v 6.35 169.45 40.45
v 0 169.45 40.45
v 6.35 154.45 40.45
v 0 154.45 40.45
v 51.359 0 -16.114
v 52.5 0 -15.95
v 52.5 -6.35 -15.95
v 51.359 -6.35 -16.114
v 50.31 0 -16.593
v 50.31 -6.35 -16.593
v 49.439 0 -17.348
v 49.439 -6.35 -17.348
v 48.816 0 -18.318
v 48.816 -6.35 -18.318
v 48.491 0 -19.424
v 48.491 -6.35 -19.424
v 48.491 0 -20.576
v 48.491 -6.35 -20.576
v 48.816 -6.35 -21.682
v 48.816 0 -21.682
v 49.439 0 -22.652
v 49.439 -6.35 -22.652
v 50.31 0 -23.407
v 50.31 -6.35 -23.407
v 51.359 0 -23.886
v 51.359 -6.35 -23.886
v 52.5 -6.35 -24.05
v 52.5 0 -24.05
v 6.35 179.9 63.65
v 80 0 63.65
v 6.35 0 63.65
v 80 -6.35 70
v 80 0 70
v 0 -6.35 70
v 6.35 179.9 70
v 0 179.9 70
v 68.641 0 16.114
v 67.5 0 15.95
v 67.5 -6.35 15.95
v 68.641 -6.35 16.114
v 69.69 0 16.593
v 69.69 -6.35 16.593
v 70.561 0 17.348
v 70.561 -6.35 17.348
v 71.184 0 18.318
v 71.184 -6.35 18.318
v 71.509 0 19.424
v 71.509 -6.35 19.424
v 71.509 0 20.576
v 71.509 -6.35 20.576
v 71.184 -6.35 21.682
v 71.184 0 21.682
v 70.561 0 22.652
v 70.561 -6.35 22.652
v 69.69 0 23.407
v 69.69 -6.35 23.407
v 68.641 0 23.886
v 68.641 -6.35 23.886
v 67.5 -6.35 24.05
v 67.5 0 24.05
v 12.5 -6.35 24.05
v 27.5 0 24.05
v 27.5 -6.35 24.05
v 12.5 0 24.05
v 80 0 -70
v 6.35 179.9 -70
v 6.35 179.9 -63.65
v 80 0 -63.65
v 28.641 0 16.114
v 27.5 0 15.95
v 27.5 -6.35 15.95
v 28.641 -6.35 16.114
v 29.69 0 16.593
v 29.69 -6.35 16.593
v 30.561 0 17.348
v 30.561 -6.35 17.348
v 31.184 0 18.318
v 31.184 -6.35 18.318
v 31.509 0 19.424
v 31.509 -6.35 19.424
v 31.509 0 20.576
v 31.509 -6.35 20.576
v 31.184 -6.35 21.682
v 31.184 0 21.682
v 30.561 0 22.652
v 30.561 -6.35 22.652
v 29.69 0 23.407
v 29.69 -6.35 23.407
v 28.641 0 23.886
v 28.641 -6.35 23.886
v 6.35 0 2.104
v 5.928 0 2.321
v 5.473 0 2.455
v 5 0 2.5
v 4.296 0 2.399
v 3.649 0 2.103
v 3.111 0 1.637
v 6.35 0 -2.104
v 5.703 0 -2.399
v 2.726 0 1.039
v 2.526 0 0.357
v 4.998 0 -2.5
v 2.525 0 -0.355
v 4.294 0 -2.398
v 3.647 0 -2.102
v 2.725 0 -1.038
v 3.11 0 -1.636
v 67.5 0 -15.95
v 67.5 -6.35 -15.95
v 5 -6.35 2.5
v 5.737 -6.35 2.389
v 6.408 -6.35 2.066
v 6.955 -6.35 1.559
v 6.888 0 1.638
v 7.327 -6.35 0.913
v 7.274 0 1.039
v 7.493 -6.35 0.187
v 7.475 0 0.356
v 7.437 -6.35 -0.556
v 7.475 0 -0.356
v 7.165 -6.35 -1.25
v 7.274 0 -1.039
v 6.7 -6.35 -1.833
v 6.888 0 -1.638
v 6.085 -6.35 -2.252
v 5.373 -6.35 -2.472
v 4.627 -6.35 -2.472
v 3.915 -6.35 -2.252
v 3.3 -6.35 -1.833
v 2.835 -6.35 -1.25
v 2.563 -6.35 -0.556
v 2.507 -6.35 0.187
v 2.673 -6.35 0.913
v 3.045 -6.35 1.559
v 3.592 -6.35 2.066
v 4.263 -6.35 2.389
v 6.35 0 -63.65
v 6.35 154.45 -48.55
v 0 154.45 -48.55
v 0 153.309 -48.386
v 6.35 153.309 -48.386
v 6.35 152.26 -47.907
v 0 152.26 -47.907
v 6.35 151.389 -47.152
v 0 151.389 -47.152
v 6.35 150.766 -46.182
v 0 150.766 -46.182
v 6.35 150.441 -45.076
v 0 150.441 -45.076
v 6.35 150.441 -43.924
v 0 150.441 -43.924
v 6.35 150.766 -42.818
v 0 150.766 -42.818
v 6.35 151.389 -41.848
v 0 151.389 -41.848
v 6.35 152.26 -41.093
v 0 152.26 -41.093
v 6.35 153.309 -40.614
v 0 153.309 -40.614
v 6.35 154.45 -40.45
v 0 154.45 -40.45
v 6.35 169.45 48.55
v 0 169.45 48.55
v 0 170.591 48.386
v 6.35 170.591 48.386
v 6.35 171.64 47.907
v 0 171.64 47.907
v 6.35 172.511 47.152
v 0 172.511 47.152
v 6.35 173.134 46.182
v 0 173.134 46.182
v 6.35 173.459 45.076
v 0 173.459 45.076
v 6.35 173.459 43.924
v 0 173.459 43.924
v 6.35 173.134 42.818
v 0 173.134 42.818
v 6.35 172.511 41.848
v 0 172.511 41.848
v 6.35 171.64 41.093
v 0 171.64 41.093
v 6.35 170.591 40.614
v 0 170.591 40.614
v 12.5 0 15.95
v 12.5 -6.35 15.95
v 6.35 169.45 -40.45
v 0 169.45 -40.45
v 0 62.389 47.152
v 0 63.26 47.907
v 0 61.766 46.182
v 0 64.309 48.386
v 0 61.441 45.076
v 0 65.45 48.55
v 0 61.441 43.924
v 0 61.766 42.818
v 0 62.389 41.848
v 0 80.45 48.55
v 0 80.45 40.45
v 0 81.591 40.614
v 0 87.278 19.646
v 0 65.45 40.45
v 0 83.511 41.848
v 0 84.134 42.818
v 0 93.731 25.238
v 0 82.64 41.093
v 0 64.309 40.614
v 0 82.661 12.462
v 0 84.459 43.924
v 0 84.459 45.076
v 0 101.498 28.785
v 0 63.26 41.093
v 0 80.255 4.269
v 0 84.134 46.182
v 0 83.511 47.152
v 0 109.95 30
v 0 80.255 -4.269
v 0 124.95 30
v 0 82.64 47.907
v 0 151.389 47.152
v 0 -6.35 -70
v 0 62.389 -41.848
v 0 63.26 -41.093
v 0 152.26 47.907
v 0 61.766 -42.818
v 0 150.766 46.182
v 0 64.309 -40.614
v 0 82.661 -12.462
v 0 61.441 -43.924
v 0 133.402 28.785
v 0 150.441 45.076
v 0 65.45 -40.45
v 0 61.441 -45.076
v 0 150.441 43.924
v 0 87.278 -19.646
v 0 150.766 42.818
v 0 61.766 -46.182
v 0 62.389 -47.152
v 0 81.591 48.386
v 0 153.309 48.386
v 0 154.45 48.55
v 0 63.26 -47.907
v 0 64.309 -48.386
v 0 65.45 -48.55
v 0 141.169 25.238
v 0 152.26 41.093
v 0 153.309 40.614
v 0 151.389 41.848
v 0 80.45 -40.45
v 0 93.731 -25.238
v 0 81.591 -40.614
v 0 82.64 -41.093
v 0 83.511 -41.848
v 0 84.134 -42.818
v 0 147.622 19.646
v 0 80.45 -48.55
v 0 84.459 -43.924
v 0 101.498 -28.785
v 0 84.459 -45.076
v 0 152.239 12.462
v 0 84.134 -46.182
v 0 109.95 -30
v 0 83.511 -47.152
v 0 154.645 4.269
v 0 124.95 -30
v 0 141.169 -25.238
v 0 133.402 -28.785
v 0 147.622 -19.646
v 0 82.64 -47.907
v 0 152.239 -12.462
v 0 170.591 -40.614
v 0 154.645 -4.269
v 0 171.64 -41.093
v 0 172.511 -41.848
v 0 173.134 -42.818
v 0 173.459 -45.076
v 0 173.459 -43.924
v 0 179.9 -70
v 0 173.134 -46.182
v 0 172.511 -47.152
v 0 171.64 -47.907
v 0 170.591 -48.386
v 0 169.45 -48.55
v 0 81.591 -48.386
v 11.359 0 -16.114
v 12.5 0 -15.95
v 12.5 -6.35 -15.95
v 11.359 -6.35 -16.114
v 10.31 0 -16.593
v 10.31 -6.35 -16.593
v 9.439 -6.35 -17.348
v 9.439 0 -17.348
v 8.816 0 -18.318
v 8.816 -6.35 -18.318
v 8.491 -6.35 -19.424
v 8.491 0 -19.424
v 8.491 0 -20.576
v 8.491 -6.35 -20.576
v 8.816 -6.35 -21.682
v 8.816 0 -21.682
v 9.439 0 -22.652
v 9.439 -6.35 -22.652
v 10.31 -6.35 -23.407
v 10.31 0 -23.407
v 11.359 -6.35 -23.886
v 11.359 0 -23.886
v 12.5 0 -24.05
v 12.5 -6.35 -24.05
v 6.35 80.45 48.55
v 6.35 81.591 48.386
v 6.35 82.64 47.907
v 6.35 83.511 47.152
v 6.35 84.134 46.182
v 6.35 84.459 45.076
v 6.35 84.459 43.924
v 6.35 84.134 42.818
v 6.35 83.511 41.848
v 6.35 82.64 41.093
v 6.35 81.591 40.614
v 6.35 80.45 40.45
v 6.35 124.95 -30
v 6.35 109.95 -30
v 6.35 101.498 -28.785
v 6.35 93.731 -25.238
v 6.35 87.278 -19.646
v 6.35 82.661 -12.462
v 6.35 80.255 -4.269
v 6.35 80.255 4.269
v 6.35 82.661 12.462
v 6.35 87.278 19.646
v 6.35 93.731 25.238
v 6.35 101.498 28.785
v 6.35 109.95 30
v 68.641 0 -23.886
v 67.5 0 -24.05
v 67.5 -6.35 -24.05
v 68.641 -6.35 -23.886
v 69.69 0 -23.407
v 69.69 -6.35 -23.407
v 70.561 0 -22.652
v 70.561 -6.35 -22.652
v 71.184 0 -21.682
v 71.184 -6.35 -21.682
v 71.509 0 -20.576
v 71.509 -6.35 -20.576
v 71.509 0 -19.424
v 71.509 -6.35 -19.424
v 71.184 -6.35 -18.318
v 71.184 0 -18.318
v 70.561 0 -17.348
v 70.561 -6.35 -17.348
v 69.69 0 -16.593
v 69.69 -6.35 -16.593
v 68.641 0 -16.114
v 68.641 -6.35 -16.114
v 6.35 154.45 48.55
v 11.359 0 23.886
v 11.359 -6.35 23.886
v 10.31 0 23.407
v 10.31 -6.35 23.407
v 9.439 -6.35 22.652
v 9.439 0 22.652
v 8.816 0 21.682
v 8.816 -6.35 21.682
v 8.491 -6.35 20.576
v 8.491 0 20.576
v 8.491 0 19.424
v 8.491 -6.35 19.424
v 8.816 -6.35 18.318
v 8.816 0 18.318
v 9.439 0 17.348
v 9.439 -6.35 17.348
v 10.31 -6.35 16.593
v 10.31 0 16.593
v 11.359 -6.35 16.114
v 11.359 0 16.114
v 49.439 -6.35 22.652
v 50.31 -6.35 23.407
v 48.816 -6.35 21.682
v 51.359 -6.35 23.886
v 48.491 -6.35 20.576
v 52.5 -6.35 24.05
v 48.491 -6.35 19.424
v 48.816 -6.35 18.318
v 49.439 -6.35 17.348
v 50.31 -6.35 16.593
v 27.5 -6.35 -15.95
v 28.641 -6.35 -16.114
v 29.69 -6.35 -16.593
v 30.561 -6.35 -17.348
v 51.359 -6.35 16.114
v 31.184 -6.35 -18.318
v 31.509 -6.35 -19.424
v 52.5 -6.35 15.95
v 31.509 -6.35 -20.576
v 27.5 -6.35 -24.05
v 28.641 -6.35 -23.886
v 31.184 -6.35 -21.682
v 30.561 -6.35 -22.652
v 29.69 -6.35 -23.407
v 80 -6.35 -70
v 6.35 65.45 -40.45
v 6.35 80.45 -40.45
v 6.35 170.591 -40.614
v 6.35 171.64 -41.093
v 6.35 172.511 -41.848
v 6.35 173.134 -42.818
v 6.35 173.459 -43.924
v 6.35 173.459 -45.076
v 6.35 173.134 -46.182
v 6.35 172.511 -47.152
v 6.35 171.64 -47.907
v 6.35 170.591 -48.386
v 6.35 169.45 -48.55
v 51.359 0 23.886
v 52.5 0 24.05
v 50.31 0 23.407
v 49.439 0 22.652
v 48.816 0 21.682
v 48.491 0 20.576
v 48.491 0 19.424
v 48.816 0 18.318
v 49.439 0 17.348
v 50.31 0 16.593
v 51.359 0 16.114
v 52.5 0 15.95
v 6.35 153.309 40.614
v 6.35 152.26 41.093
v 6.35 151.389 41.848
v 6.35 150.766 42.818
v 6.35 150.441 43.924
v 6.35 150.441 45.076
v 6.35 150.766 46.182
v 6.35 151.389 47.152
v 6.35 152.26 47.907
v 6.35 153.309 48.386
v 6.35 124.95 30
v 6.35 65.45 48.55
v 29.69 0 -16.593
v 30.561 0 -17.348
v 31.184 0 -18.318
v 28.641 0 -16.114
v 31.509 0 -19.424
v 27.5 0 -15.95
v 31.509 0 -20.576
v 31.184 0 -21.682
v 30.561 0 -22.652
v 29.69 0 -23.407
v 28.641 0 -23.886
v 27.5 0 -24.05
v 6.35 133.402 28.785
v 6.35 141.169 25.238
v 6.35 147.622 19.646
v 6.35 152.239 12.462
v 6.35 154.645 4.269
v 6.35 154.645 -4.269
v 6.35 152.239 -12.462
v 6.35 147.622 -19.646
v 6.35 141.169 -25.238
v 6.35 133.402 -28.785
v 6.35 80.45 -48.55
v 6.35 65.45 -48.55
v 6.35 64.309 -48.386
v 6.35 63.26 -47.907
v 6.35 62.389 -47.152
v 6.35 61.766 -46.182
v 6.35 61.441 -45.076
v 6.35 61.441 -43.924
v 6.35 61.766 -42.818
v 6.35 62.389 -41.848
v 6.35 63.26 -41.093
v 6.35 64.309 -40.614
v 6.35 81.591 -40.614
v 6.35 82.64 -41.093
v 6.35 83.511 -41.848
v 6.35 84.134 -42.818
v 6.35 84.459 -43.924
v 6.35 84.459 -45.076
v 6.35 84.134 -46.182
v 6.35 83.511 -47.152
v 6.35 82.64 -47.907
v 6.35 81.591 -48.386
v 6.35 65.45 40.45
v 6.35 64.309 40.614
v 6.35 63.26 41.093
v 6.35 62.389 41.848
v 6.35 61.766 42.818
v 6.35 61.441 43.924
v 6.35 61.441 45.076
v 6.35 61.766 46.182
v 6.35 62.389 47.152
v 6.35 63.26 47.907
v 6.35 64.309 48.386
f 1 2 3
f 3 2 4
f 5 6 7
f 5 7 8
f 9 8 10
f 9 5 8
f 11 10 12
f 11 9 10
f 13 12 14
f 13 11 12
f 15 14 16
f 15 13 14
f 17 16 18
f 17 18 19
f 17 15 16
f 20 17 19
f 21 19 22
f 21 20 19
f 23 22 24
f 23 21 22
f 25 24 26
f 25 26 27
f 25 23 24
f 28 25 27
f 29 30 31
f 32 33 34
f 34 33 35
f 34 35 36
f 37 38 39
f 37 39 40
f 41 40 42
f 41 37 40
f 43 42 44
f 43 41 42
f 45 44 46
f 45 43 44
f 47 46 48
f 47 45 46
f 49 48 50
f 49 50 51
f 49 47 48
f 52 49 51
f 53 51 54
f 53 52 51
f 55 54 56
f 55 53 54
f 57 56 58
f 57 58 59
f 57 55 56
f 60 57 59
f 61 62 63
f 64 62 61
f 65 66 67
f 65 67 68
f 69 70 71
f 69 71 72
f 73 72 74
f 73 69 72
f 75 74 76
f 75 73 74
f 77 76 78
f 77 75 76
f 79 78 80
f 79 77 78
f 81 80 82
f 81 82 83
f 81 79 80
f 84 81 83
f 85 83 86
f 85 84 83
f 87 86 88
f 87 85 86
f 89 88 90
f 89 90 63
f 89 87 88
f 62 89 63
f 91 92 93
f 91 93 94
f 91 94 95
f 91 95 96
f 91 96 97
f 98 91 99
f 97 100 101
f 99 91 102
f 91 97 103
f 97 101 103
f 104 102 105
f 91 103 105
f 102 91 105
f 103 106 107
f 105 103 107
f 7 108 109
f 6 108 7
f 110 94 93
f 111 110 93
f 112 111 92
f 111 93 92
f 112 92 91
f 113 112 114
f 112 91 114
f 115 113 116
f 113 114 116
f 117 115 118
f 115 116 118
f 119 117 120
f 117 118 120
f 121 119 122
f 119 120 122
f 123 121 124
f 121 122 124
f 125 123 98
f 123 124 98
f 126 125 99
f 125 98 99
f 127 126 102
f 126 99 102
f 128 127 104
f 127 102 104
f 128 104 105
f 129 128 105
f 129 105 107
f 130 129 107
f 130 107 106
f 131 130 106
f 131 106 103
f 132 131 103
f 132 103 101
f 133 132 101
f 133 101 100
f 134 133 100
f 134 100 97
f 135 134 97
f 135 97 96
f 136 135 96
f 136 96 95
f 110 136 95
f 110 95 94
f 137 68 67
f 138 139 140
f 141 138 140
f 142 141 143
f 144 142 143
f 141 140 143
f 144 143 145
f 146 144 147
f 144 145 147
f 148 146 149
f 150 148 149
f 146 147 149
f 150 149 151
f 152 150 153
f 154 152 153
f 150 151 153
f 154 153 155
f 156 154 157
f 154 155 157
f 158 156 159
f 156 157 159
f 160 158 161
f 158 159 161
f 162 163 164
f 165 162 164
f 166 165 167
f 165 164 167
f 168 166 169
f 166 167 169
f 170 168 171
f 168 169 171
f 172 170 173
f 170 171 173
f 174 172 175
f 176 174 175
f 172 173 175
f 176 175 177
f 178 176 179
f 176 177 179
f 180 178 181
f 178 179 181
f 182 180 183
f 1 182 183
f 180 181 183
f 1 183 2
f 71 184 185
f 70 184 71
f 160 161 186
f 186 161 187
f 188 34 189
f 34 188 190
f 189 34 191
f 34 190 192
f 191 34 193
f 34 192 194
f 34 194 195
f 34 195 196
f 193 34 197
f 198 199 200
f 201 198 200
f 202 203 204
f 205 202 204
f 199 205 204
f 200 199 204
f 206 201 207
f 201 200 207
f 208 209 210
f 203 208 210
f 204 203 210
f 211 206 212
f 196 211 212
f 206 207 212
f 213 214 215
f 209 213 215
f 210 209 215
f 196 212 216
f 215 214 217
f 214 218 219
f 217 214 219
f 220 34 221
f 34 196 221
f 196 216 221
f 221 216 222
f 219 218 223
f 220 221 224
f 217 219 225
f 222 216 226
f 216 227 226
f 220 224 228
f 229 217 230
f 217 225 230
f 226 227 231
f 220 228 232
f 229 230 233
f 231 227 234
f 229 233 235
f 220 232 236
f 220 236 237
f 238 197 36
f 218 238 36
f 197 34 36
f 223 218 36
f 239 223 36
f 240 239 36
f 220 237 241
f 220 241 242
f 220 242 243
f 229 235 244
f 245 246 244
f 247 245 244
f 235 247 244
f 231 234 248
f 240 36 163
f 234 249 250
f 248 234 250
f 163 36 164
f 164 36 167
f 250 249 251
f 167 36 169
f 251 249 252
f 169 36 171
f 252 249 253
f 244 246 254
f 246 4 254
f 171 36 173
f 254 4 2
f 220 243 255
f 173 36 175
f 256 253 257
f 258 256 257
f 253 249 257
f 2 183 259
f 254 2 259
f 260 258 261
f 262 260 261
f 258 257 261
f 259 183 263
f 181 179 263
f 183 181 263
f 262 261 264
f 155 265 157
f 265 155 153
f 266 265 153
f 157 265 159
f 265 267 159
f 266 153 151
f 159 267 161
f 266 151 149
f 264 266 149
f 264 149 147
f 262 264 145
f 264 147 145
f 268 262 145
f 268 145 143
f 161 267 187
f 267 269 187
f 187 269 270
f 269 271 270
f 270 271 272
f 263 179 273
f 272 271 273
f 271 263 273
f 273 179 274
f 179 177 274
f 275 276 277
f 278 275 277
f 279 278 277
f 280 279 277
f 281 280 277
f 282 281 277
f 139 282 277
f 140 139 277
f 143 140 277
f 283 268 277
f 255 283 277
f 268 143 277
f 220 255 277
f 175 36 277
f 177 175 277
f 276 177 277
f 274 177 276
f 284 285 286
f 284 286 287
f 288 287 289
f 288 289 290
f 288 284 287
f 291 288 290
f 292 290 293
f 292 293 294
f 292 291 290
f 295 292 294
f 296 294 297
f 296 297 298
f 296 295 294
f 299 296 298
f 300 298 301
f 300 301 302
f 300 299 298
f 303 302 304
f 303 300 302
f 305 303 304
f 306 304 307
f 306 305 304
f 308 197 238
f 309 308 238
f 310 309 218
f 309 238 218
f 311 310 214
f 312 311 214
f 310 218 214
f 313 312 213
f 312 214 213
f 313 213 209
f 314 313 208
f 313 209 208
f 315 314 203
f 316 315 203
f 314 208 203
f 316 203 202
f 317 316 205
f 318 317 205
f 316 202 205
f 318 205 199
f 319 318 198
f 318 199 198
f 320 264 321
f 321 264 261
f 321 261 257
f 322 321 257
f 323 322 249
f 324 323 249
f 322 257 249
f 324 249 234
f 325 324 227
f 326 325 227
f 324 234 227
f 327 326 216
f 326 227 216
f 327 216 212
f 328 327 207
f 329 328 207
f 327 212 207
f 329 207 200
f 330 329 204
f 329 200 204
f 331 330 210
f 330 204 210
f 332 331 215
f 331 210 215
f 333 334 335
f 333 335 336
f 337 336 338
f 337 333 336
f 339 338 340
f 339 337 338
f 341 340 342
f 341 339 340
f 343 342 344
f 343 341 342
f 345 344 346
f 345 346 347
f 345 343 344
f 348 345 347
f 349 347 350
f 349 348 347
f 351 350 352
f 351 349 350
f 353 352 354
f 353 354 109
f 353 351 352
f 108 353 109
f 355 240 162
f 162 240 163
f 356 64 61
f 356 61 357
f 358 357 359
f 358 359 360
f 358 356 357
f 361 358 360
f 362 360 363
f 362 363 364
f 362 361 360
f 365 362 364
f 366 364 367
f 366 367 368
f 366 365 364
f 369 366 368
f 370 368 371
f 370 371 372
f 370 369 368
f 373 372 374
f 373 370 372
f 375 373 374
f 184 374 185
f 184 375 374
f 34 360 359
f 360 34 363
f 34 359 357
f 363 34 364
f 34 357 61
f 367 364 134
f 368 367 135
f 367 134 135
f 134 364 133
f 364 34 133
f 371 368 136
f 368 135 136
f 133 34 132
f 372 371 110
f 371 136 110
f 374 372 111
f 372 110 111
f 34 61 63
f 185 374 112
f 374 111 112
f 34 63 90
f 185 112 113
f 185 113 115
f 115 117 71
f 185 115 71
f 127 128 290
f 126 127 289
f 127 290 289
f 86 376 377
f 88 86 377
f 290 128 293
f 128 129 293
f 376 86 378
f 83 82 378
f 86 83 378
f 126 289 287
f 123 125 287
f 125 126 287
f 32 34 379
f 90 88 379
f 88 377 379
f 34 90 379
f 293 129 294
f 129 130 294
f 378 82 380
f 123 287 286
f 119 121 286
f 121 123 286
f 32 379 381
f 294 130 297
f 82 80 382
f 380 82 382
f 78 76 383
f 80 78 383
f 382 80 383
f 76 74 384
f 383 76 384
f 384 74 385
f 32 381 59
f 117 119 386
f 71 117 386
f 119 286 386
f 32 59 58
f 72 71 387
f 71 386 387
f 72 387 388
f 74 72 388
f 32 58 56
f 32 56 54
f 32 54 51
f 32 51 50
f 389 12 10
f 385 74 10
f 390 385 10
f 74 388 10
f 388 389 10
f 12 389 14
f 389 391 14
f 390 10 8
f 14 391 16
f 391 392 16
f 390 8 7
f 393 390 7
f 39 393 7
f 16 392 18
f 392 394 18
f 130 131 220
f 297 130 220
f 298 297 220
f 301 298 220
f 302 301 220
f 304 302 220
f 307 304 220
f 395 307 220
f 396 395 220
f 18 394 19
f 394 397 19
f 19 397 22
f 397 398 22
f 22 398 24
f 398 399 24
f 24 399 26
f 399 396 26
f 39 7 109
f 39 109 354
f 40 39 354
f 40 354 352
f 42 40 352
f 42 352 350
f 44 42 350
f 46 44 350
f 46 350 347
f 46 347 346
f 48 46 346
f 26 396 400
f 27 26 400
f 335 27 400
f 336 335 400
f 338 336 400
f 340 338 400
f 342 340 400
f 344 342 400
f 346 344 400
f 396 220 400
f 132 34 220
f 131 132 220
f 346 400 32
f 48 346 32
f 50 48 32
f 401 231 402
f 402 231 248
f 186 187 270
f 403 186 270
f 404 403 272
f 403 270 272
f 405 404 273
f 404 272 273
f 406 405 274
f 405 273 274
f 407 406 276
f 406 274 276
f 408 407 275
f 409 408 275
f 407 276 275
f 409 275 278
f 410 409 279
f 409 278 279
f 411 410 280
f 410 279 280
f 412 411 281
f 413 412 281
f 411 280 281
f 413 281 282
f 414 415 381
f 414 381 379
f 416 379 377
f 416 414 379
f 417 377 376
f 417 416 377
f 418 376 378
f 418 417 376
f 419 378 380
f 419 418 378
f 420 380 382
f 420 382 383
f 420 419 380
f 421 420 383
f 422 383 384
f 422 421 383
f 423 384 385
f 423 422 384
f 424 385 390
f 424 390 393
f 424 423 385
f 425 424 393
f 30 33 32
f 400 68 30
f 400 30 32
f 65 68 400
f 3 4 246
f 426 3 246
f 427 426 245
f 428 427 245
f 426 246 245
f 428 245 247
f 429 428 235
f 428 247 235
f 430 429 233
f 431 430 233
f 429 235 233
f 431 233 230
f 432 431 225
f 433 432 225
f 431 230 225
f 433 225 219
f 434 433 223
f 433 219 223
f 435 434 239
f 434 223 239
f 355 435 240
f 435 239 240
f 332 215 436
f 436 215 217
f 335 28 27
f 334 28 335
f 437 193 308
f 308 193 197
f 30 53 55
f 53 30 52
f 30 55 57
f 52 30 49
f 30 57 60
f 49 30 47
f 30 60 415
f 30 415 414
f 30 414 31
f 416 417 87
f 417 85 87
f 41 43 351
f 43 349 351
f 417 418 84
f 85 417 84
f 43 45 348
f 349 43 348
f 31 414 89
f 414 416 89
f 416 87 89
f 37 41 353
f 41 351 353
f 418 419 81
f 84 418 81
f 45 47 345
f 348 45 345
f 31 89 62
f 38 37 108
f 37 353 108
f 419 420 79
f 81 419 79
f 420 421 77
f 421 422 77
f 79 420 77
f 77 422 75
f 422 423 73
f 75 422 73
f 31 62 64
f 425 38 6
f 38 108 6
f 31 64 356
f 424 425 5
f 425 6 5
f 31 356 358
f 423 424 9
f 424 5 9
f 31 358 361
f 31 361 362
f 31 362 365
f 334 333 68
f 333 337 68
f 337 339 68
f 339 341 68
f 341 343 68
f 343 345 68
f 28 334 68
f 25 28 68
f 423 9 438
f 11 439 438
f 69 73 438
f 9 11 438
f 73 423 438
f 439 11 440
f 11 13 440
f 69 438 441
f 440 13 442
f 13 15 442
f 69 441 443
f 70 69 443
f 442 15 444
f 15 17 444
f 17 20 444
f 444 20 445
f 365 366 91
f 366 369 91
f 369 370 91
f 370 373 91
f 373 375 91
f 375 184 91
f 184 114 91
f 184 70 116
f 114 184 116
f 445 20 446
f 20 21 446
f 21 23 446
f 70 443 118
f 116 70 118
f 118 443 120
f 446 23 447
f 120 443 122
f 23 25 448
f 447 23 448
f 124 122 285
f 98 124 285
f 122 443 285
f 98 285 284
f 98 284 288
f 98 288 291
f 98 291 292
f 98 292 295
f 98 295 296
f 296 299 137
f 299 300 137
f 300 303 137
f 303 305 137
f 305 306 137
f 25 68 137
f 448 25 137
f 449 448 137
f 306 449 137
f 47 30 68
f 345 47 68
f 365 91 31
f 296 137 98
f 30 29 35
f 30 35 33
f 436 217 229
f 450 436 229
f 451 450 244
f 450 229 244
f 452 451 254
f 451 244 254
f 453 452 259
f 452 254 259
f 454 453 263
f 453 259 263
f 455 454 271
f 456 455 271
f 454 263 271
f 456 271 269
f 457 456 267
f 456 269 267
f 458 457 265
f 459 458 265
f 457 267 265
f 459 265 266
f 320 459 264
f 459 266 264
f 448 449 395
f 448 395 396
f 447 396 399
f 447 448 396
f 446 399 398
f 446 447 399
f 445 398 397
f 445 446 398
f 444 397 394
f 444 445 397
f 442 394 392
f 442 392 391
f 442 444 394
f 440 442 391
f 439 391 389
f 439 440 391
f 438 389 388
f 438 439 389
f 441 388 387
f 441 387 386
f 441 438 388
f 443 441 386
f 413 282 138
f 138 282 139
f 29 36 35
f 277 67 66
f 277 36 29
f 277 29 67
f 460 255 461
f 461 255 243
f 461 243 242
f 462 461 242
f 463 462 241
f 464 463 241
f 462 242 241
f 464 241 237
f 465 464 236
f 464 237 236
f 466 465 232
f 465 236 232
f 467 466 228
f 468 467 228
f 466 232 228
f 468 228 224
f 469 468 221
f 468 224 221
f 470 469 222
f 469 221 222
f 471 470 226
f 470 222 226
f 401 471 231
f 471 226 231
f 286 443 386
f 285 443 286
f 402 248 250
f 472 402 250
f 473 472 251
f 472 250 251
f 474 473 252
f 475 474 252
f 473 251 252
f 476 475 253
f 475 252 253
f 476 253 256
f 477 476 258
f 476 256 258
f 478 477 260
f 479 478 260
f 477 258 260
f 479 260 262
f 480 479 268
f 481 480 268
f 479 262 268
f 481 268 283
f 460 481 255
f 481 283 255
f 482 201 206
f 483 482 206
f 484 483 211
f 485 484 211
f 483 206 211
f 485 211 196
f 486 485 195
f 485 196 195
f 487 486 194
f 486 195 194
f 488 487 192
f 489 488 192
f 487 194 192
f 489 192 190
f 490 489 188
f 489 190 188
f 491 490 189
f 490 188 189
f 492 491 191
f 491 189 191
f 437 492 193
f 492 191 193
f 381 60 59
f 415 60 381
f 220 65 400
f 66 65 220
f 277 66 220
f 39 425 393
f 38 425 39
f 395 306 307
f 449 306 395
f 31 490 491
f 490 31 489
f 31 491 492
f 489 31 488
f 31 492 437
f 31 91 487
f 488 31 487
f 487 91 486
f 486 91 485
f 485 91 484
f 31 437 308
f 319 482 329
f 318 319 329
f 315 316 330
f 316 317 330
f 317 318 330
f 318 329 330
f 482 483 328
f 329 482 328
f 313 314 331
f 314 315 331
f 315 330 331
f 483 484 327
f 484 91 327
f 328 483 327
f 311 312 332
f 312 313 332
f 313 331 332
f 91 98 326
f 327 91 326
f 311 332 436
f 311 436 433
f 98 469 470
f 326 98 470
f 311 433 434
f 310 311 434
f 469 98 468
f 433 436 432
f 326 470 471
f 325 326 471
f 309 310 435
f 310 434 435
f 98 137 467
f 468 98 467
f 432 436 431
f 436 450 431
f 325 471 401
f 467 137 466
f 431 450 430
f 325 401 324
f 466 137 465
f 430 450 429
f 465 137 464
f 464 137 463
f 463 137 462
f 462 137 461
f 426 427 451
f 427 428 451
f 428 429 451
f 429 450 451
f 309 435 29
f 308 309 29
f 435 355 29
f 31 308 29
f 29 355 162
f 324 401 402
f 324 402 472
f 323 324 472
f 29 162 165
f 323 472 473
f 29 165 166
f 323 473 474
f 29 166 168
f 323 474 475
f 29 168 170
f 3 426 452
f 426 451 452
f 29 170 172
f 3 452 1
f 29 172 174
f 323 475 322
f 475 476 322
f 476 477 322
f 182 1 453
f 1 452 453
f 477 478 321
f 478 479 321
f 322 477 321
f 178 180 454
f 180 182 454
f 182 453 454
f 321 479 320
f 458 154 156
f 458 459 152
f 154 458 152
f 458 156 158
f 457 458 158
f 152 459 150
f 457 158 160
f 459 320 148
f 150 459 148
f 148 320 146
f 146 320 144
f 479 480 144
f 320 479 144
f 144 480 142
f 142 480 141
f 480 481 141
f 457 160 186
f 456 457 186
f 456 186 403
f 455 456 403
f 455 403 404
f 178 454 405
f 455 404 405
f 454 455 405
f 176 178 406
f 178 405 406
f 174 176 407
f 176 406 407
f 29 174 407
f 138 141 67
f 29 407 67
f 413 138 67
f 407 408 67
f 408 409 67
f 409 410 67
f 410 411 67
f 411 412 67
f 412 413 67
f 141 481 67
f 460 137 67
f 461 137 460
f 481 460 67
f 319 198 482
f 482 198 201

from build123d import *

# Parameters (mm, degrees)
SKETCH1_W                = 80
SKETCH1_H                = 140
SKETCH1_R                = 2.5
BOSS_EXTRUDE1_DEPTH      = 6.35
SKETCH3_W                = 140
SKETCH3_H                = 179.9
BOSS_EXTRUDE2_DEPTH      = 6.35
BOSS_EXTRUDE3_DEPTH      = 70
BOSS_EXTRUDE3_DEPTH_BACK = 70
CUT_EXTRUDE1_DEPTH       = 63.65
CUT_EXTRUDE1_DEPTH_BACK  = 63.65


with BuildPart() as part:
    # Sketch1 → Boss-Extrude1 (new body)
    with BuildSketch(Plane(origin=(0, 0, 0), x_dir=(1, 0, 0), z_dir=(0, 1, 0))):
        with Locations((40, 0)):
            Rectangle(SKETCH1_W, SKETCH1_H)
        with Locations(Location((5, 0, 0), (0, 0, 270))):
            Circle(SKETCH1_R, mode=Mode.SUBTRACT)
        with BuildLine():
            Line((12.5, 24.05), (27.5, 24.05))
            ThreePointArc((27.5, 24.05), (31.55, 20), (27.5, 15.95))
            Line((27.5, 15.95), (12.5, 15.95))
            ThreePointArc((12.5, 15.95), (8.45, 20), (12.5, 24.05))
        make_face(mode=Mode.SUBTRACT)
        with BuildLine():
            Line((52.5, 24.05), (67.5, 24.05))
            ThreePointArc((67.5, 24.05), (71.55, 20), (67.5, 15.95))
            Line((67.5, 15.95), (52.5, 15.95))
            ThreePointArc((52.5, 15.95), (48.45, 20), (52.5, 24.05))
        make_face(mode=Mode.SUBTRACT)
        with BuildLine():
            Line((52.5, -15.95), (67.5, -15.95))
            ThreePointArc((67.5, -15.95), (71.55, -20), (67.5, -24.05))
            Line((67.5, -24.05), (52.5, -24.05))
            ThreePointArc((52.5, -24.05), (48.45, -20), (52.5, -15.95))
        make_face(mode=Mode.SUBTRACT)
        with BuildLine():
            Line((12.5, -15.95), (27.5, -15.95))
            ThreePointArc((27.5, -15.95), (31.55, -20), (27.5, -24.05))
            Line((27.5, -24.05), (12.5, -24.05))
            ThreePointArc((12.5, -24.05), (8.45, -20), (12.5, -15.95))
        make_face(mode=Mode.SUBTRACT)
    extrude(amount=-BOSS_EXTRUDE1_DEPTH)

    # Sketch3 → Boss-Extrude2 (add)
    with BuildSketch(Plane(origin=(0, 0, 0), x_dir=(0, 0, -1), z_dir=(1, 0, 0))):
        with Locations((0, 89.95)):
            Rectangle(SKETCH3_W, SKETCH3_H)
        with BuildLine():
            Line((-40.45, 169.45), (-40.45, 154.45))
            ThreePointArc((-40.45, 154.45), (-44.5, 150.4), (-48.55, 154.45))
            Line((-48.55, 154.45), (-48.55, 169.45))
            ThreePointArc((-48.55, 169.45), (-44.5, 173.5), (-40.45, 169.45))
        make_face(mode=Mode.SUBTRACT)
        with BuildLine():
            Line((48.55, 169.45), (48.55, 154.45))
            ThreePointArc((48.55, 154.45), (44.5, 150.4), (40.45, 154.45))
            Line((40.45, 154.45), (40.45, 169.45))
            ThreePointArc((40.45, 169.45), (44.5, 173.5), (48.55, 169.45))
        make_face(mode=Mode.SUBTRACT)
        with BuildLine():
            Line((48.55, 80.45), (48.55, 65.45))
            ThreePointArc((48.55, 65.45), (44.5, 61.4), (40.45, 65.45))
            Line((40.45, 65.45), (40.45, 80.45))
            ThreePointArc((40.45, 80.45), (44.5, 84.5), (48.55, 80.45))
        make_face(mode=Mode.SUBTRACT)
        with BuildLine():
            Line((-40.45, 80.45), (-40.45, 65.45))
            ThreePointArc((-40.45, 65.45), (-44.5, 61.4), (-48.55, 65.45))
            Line((-48.55, 65.45), (-48.55, 80.45))
            ThreePointArc((-48.55, 80.45), (-44.5, 84.5), (-40.45, 80.45))
        make_face(mode=Mode.SUBTRACT)
        with BuildLine():
            Line((30, 124.95), (30, 109.95))
            ThreePointArc((30, 109.95), (0, 79.95), (-30, 109.95))
            Line((-30, 109.95), (-30, 124.95))
            ThreePointArc((-30, 124.95), (0, 154.95), (30, 124.95))
        make_face(mode=Mode.SUBTRACT)
    extrude(amount=BOSS_EXTRUDE2_DEPTH)

    # Sketch4 → Boss-Extrude3 (add, two sides: drawn at the far end of the back side and taken through both)
    with BuildSketch(Plane.XY.offset(-BOSS_EXTRUDE3_DEPTH_BACK)):
        Polygon((6.35, 179.9), (80, 0), (6.35, 0), align=None)
    extrude(amount=BOSS_EXTRUDE3_DEPTH + BOSS_EXTRUDE3_DEPTH_BACK)

    # Sketch5 → Cut-Extrude1 (cut, two sides: drawn at the far end of the back side and taken through both)
    with BuildSketch(Plane.XY.offset(-CUT_EXTRUDE1_DEPTH_BACK)):
        Polygon((6.35, 179.9), (80, 0), (6.35, 0), align=None)
    extrude(amount=CUT_EXTRUDE1_DEPTH + CUT_EXTRUDE1_DEPTH_BACK, mode=Mode.SUBTRACT)


solid = part.part
